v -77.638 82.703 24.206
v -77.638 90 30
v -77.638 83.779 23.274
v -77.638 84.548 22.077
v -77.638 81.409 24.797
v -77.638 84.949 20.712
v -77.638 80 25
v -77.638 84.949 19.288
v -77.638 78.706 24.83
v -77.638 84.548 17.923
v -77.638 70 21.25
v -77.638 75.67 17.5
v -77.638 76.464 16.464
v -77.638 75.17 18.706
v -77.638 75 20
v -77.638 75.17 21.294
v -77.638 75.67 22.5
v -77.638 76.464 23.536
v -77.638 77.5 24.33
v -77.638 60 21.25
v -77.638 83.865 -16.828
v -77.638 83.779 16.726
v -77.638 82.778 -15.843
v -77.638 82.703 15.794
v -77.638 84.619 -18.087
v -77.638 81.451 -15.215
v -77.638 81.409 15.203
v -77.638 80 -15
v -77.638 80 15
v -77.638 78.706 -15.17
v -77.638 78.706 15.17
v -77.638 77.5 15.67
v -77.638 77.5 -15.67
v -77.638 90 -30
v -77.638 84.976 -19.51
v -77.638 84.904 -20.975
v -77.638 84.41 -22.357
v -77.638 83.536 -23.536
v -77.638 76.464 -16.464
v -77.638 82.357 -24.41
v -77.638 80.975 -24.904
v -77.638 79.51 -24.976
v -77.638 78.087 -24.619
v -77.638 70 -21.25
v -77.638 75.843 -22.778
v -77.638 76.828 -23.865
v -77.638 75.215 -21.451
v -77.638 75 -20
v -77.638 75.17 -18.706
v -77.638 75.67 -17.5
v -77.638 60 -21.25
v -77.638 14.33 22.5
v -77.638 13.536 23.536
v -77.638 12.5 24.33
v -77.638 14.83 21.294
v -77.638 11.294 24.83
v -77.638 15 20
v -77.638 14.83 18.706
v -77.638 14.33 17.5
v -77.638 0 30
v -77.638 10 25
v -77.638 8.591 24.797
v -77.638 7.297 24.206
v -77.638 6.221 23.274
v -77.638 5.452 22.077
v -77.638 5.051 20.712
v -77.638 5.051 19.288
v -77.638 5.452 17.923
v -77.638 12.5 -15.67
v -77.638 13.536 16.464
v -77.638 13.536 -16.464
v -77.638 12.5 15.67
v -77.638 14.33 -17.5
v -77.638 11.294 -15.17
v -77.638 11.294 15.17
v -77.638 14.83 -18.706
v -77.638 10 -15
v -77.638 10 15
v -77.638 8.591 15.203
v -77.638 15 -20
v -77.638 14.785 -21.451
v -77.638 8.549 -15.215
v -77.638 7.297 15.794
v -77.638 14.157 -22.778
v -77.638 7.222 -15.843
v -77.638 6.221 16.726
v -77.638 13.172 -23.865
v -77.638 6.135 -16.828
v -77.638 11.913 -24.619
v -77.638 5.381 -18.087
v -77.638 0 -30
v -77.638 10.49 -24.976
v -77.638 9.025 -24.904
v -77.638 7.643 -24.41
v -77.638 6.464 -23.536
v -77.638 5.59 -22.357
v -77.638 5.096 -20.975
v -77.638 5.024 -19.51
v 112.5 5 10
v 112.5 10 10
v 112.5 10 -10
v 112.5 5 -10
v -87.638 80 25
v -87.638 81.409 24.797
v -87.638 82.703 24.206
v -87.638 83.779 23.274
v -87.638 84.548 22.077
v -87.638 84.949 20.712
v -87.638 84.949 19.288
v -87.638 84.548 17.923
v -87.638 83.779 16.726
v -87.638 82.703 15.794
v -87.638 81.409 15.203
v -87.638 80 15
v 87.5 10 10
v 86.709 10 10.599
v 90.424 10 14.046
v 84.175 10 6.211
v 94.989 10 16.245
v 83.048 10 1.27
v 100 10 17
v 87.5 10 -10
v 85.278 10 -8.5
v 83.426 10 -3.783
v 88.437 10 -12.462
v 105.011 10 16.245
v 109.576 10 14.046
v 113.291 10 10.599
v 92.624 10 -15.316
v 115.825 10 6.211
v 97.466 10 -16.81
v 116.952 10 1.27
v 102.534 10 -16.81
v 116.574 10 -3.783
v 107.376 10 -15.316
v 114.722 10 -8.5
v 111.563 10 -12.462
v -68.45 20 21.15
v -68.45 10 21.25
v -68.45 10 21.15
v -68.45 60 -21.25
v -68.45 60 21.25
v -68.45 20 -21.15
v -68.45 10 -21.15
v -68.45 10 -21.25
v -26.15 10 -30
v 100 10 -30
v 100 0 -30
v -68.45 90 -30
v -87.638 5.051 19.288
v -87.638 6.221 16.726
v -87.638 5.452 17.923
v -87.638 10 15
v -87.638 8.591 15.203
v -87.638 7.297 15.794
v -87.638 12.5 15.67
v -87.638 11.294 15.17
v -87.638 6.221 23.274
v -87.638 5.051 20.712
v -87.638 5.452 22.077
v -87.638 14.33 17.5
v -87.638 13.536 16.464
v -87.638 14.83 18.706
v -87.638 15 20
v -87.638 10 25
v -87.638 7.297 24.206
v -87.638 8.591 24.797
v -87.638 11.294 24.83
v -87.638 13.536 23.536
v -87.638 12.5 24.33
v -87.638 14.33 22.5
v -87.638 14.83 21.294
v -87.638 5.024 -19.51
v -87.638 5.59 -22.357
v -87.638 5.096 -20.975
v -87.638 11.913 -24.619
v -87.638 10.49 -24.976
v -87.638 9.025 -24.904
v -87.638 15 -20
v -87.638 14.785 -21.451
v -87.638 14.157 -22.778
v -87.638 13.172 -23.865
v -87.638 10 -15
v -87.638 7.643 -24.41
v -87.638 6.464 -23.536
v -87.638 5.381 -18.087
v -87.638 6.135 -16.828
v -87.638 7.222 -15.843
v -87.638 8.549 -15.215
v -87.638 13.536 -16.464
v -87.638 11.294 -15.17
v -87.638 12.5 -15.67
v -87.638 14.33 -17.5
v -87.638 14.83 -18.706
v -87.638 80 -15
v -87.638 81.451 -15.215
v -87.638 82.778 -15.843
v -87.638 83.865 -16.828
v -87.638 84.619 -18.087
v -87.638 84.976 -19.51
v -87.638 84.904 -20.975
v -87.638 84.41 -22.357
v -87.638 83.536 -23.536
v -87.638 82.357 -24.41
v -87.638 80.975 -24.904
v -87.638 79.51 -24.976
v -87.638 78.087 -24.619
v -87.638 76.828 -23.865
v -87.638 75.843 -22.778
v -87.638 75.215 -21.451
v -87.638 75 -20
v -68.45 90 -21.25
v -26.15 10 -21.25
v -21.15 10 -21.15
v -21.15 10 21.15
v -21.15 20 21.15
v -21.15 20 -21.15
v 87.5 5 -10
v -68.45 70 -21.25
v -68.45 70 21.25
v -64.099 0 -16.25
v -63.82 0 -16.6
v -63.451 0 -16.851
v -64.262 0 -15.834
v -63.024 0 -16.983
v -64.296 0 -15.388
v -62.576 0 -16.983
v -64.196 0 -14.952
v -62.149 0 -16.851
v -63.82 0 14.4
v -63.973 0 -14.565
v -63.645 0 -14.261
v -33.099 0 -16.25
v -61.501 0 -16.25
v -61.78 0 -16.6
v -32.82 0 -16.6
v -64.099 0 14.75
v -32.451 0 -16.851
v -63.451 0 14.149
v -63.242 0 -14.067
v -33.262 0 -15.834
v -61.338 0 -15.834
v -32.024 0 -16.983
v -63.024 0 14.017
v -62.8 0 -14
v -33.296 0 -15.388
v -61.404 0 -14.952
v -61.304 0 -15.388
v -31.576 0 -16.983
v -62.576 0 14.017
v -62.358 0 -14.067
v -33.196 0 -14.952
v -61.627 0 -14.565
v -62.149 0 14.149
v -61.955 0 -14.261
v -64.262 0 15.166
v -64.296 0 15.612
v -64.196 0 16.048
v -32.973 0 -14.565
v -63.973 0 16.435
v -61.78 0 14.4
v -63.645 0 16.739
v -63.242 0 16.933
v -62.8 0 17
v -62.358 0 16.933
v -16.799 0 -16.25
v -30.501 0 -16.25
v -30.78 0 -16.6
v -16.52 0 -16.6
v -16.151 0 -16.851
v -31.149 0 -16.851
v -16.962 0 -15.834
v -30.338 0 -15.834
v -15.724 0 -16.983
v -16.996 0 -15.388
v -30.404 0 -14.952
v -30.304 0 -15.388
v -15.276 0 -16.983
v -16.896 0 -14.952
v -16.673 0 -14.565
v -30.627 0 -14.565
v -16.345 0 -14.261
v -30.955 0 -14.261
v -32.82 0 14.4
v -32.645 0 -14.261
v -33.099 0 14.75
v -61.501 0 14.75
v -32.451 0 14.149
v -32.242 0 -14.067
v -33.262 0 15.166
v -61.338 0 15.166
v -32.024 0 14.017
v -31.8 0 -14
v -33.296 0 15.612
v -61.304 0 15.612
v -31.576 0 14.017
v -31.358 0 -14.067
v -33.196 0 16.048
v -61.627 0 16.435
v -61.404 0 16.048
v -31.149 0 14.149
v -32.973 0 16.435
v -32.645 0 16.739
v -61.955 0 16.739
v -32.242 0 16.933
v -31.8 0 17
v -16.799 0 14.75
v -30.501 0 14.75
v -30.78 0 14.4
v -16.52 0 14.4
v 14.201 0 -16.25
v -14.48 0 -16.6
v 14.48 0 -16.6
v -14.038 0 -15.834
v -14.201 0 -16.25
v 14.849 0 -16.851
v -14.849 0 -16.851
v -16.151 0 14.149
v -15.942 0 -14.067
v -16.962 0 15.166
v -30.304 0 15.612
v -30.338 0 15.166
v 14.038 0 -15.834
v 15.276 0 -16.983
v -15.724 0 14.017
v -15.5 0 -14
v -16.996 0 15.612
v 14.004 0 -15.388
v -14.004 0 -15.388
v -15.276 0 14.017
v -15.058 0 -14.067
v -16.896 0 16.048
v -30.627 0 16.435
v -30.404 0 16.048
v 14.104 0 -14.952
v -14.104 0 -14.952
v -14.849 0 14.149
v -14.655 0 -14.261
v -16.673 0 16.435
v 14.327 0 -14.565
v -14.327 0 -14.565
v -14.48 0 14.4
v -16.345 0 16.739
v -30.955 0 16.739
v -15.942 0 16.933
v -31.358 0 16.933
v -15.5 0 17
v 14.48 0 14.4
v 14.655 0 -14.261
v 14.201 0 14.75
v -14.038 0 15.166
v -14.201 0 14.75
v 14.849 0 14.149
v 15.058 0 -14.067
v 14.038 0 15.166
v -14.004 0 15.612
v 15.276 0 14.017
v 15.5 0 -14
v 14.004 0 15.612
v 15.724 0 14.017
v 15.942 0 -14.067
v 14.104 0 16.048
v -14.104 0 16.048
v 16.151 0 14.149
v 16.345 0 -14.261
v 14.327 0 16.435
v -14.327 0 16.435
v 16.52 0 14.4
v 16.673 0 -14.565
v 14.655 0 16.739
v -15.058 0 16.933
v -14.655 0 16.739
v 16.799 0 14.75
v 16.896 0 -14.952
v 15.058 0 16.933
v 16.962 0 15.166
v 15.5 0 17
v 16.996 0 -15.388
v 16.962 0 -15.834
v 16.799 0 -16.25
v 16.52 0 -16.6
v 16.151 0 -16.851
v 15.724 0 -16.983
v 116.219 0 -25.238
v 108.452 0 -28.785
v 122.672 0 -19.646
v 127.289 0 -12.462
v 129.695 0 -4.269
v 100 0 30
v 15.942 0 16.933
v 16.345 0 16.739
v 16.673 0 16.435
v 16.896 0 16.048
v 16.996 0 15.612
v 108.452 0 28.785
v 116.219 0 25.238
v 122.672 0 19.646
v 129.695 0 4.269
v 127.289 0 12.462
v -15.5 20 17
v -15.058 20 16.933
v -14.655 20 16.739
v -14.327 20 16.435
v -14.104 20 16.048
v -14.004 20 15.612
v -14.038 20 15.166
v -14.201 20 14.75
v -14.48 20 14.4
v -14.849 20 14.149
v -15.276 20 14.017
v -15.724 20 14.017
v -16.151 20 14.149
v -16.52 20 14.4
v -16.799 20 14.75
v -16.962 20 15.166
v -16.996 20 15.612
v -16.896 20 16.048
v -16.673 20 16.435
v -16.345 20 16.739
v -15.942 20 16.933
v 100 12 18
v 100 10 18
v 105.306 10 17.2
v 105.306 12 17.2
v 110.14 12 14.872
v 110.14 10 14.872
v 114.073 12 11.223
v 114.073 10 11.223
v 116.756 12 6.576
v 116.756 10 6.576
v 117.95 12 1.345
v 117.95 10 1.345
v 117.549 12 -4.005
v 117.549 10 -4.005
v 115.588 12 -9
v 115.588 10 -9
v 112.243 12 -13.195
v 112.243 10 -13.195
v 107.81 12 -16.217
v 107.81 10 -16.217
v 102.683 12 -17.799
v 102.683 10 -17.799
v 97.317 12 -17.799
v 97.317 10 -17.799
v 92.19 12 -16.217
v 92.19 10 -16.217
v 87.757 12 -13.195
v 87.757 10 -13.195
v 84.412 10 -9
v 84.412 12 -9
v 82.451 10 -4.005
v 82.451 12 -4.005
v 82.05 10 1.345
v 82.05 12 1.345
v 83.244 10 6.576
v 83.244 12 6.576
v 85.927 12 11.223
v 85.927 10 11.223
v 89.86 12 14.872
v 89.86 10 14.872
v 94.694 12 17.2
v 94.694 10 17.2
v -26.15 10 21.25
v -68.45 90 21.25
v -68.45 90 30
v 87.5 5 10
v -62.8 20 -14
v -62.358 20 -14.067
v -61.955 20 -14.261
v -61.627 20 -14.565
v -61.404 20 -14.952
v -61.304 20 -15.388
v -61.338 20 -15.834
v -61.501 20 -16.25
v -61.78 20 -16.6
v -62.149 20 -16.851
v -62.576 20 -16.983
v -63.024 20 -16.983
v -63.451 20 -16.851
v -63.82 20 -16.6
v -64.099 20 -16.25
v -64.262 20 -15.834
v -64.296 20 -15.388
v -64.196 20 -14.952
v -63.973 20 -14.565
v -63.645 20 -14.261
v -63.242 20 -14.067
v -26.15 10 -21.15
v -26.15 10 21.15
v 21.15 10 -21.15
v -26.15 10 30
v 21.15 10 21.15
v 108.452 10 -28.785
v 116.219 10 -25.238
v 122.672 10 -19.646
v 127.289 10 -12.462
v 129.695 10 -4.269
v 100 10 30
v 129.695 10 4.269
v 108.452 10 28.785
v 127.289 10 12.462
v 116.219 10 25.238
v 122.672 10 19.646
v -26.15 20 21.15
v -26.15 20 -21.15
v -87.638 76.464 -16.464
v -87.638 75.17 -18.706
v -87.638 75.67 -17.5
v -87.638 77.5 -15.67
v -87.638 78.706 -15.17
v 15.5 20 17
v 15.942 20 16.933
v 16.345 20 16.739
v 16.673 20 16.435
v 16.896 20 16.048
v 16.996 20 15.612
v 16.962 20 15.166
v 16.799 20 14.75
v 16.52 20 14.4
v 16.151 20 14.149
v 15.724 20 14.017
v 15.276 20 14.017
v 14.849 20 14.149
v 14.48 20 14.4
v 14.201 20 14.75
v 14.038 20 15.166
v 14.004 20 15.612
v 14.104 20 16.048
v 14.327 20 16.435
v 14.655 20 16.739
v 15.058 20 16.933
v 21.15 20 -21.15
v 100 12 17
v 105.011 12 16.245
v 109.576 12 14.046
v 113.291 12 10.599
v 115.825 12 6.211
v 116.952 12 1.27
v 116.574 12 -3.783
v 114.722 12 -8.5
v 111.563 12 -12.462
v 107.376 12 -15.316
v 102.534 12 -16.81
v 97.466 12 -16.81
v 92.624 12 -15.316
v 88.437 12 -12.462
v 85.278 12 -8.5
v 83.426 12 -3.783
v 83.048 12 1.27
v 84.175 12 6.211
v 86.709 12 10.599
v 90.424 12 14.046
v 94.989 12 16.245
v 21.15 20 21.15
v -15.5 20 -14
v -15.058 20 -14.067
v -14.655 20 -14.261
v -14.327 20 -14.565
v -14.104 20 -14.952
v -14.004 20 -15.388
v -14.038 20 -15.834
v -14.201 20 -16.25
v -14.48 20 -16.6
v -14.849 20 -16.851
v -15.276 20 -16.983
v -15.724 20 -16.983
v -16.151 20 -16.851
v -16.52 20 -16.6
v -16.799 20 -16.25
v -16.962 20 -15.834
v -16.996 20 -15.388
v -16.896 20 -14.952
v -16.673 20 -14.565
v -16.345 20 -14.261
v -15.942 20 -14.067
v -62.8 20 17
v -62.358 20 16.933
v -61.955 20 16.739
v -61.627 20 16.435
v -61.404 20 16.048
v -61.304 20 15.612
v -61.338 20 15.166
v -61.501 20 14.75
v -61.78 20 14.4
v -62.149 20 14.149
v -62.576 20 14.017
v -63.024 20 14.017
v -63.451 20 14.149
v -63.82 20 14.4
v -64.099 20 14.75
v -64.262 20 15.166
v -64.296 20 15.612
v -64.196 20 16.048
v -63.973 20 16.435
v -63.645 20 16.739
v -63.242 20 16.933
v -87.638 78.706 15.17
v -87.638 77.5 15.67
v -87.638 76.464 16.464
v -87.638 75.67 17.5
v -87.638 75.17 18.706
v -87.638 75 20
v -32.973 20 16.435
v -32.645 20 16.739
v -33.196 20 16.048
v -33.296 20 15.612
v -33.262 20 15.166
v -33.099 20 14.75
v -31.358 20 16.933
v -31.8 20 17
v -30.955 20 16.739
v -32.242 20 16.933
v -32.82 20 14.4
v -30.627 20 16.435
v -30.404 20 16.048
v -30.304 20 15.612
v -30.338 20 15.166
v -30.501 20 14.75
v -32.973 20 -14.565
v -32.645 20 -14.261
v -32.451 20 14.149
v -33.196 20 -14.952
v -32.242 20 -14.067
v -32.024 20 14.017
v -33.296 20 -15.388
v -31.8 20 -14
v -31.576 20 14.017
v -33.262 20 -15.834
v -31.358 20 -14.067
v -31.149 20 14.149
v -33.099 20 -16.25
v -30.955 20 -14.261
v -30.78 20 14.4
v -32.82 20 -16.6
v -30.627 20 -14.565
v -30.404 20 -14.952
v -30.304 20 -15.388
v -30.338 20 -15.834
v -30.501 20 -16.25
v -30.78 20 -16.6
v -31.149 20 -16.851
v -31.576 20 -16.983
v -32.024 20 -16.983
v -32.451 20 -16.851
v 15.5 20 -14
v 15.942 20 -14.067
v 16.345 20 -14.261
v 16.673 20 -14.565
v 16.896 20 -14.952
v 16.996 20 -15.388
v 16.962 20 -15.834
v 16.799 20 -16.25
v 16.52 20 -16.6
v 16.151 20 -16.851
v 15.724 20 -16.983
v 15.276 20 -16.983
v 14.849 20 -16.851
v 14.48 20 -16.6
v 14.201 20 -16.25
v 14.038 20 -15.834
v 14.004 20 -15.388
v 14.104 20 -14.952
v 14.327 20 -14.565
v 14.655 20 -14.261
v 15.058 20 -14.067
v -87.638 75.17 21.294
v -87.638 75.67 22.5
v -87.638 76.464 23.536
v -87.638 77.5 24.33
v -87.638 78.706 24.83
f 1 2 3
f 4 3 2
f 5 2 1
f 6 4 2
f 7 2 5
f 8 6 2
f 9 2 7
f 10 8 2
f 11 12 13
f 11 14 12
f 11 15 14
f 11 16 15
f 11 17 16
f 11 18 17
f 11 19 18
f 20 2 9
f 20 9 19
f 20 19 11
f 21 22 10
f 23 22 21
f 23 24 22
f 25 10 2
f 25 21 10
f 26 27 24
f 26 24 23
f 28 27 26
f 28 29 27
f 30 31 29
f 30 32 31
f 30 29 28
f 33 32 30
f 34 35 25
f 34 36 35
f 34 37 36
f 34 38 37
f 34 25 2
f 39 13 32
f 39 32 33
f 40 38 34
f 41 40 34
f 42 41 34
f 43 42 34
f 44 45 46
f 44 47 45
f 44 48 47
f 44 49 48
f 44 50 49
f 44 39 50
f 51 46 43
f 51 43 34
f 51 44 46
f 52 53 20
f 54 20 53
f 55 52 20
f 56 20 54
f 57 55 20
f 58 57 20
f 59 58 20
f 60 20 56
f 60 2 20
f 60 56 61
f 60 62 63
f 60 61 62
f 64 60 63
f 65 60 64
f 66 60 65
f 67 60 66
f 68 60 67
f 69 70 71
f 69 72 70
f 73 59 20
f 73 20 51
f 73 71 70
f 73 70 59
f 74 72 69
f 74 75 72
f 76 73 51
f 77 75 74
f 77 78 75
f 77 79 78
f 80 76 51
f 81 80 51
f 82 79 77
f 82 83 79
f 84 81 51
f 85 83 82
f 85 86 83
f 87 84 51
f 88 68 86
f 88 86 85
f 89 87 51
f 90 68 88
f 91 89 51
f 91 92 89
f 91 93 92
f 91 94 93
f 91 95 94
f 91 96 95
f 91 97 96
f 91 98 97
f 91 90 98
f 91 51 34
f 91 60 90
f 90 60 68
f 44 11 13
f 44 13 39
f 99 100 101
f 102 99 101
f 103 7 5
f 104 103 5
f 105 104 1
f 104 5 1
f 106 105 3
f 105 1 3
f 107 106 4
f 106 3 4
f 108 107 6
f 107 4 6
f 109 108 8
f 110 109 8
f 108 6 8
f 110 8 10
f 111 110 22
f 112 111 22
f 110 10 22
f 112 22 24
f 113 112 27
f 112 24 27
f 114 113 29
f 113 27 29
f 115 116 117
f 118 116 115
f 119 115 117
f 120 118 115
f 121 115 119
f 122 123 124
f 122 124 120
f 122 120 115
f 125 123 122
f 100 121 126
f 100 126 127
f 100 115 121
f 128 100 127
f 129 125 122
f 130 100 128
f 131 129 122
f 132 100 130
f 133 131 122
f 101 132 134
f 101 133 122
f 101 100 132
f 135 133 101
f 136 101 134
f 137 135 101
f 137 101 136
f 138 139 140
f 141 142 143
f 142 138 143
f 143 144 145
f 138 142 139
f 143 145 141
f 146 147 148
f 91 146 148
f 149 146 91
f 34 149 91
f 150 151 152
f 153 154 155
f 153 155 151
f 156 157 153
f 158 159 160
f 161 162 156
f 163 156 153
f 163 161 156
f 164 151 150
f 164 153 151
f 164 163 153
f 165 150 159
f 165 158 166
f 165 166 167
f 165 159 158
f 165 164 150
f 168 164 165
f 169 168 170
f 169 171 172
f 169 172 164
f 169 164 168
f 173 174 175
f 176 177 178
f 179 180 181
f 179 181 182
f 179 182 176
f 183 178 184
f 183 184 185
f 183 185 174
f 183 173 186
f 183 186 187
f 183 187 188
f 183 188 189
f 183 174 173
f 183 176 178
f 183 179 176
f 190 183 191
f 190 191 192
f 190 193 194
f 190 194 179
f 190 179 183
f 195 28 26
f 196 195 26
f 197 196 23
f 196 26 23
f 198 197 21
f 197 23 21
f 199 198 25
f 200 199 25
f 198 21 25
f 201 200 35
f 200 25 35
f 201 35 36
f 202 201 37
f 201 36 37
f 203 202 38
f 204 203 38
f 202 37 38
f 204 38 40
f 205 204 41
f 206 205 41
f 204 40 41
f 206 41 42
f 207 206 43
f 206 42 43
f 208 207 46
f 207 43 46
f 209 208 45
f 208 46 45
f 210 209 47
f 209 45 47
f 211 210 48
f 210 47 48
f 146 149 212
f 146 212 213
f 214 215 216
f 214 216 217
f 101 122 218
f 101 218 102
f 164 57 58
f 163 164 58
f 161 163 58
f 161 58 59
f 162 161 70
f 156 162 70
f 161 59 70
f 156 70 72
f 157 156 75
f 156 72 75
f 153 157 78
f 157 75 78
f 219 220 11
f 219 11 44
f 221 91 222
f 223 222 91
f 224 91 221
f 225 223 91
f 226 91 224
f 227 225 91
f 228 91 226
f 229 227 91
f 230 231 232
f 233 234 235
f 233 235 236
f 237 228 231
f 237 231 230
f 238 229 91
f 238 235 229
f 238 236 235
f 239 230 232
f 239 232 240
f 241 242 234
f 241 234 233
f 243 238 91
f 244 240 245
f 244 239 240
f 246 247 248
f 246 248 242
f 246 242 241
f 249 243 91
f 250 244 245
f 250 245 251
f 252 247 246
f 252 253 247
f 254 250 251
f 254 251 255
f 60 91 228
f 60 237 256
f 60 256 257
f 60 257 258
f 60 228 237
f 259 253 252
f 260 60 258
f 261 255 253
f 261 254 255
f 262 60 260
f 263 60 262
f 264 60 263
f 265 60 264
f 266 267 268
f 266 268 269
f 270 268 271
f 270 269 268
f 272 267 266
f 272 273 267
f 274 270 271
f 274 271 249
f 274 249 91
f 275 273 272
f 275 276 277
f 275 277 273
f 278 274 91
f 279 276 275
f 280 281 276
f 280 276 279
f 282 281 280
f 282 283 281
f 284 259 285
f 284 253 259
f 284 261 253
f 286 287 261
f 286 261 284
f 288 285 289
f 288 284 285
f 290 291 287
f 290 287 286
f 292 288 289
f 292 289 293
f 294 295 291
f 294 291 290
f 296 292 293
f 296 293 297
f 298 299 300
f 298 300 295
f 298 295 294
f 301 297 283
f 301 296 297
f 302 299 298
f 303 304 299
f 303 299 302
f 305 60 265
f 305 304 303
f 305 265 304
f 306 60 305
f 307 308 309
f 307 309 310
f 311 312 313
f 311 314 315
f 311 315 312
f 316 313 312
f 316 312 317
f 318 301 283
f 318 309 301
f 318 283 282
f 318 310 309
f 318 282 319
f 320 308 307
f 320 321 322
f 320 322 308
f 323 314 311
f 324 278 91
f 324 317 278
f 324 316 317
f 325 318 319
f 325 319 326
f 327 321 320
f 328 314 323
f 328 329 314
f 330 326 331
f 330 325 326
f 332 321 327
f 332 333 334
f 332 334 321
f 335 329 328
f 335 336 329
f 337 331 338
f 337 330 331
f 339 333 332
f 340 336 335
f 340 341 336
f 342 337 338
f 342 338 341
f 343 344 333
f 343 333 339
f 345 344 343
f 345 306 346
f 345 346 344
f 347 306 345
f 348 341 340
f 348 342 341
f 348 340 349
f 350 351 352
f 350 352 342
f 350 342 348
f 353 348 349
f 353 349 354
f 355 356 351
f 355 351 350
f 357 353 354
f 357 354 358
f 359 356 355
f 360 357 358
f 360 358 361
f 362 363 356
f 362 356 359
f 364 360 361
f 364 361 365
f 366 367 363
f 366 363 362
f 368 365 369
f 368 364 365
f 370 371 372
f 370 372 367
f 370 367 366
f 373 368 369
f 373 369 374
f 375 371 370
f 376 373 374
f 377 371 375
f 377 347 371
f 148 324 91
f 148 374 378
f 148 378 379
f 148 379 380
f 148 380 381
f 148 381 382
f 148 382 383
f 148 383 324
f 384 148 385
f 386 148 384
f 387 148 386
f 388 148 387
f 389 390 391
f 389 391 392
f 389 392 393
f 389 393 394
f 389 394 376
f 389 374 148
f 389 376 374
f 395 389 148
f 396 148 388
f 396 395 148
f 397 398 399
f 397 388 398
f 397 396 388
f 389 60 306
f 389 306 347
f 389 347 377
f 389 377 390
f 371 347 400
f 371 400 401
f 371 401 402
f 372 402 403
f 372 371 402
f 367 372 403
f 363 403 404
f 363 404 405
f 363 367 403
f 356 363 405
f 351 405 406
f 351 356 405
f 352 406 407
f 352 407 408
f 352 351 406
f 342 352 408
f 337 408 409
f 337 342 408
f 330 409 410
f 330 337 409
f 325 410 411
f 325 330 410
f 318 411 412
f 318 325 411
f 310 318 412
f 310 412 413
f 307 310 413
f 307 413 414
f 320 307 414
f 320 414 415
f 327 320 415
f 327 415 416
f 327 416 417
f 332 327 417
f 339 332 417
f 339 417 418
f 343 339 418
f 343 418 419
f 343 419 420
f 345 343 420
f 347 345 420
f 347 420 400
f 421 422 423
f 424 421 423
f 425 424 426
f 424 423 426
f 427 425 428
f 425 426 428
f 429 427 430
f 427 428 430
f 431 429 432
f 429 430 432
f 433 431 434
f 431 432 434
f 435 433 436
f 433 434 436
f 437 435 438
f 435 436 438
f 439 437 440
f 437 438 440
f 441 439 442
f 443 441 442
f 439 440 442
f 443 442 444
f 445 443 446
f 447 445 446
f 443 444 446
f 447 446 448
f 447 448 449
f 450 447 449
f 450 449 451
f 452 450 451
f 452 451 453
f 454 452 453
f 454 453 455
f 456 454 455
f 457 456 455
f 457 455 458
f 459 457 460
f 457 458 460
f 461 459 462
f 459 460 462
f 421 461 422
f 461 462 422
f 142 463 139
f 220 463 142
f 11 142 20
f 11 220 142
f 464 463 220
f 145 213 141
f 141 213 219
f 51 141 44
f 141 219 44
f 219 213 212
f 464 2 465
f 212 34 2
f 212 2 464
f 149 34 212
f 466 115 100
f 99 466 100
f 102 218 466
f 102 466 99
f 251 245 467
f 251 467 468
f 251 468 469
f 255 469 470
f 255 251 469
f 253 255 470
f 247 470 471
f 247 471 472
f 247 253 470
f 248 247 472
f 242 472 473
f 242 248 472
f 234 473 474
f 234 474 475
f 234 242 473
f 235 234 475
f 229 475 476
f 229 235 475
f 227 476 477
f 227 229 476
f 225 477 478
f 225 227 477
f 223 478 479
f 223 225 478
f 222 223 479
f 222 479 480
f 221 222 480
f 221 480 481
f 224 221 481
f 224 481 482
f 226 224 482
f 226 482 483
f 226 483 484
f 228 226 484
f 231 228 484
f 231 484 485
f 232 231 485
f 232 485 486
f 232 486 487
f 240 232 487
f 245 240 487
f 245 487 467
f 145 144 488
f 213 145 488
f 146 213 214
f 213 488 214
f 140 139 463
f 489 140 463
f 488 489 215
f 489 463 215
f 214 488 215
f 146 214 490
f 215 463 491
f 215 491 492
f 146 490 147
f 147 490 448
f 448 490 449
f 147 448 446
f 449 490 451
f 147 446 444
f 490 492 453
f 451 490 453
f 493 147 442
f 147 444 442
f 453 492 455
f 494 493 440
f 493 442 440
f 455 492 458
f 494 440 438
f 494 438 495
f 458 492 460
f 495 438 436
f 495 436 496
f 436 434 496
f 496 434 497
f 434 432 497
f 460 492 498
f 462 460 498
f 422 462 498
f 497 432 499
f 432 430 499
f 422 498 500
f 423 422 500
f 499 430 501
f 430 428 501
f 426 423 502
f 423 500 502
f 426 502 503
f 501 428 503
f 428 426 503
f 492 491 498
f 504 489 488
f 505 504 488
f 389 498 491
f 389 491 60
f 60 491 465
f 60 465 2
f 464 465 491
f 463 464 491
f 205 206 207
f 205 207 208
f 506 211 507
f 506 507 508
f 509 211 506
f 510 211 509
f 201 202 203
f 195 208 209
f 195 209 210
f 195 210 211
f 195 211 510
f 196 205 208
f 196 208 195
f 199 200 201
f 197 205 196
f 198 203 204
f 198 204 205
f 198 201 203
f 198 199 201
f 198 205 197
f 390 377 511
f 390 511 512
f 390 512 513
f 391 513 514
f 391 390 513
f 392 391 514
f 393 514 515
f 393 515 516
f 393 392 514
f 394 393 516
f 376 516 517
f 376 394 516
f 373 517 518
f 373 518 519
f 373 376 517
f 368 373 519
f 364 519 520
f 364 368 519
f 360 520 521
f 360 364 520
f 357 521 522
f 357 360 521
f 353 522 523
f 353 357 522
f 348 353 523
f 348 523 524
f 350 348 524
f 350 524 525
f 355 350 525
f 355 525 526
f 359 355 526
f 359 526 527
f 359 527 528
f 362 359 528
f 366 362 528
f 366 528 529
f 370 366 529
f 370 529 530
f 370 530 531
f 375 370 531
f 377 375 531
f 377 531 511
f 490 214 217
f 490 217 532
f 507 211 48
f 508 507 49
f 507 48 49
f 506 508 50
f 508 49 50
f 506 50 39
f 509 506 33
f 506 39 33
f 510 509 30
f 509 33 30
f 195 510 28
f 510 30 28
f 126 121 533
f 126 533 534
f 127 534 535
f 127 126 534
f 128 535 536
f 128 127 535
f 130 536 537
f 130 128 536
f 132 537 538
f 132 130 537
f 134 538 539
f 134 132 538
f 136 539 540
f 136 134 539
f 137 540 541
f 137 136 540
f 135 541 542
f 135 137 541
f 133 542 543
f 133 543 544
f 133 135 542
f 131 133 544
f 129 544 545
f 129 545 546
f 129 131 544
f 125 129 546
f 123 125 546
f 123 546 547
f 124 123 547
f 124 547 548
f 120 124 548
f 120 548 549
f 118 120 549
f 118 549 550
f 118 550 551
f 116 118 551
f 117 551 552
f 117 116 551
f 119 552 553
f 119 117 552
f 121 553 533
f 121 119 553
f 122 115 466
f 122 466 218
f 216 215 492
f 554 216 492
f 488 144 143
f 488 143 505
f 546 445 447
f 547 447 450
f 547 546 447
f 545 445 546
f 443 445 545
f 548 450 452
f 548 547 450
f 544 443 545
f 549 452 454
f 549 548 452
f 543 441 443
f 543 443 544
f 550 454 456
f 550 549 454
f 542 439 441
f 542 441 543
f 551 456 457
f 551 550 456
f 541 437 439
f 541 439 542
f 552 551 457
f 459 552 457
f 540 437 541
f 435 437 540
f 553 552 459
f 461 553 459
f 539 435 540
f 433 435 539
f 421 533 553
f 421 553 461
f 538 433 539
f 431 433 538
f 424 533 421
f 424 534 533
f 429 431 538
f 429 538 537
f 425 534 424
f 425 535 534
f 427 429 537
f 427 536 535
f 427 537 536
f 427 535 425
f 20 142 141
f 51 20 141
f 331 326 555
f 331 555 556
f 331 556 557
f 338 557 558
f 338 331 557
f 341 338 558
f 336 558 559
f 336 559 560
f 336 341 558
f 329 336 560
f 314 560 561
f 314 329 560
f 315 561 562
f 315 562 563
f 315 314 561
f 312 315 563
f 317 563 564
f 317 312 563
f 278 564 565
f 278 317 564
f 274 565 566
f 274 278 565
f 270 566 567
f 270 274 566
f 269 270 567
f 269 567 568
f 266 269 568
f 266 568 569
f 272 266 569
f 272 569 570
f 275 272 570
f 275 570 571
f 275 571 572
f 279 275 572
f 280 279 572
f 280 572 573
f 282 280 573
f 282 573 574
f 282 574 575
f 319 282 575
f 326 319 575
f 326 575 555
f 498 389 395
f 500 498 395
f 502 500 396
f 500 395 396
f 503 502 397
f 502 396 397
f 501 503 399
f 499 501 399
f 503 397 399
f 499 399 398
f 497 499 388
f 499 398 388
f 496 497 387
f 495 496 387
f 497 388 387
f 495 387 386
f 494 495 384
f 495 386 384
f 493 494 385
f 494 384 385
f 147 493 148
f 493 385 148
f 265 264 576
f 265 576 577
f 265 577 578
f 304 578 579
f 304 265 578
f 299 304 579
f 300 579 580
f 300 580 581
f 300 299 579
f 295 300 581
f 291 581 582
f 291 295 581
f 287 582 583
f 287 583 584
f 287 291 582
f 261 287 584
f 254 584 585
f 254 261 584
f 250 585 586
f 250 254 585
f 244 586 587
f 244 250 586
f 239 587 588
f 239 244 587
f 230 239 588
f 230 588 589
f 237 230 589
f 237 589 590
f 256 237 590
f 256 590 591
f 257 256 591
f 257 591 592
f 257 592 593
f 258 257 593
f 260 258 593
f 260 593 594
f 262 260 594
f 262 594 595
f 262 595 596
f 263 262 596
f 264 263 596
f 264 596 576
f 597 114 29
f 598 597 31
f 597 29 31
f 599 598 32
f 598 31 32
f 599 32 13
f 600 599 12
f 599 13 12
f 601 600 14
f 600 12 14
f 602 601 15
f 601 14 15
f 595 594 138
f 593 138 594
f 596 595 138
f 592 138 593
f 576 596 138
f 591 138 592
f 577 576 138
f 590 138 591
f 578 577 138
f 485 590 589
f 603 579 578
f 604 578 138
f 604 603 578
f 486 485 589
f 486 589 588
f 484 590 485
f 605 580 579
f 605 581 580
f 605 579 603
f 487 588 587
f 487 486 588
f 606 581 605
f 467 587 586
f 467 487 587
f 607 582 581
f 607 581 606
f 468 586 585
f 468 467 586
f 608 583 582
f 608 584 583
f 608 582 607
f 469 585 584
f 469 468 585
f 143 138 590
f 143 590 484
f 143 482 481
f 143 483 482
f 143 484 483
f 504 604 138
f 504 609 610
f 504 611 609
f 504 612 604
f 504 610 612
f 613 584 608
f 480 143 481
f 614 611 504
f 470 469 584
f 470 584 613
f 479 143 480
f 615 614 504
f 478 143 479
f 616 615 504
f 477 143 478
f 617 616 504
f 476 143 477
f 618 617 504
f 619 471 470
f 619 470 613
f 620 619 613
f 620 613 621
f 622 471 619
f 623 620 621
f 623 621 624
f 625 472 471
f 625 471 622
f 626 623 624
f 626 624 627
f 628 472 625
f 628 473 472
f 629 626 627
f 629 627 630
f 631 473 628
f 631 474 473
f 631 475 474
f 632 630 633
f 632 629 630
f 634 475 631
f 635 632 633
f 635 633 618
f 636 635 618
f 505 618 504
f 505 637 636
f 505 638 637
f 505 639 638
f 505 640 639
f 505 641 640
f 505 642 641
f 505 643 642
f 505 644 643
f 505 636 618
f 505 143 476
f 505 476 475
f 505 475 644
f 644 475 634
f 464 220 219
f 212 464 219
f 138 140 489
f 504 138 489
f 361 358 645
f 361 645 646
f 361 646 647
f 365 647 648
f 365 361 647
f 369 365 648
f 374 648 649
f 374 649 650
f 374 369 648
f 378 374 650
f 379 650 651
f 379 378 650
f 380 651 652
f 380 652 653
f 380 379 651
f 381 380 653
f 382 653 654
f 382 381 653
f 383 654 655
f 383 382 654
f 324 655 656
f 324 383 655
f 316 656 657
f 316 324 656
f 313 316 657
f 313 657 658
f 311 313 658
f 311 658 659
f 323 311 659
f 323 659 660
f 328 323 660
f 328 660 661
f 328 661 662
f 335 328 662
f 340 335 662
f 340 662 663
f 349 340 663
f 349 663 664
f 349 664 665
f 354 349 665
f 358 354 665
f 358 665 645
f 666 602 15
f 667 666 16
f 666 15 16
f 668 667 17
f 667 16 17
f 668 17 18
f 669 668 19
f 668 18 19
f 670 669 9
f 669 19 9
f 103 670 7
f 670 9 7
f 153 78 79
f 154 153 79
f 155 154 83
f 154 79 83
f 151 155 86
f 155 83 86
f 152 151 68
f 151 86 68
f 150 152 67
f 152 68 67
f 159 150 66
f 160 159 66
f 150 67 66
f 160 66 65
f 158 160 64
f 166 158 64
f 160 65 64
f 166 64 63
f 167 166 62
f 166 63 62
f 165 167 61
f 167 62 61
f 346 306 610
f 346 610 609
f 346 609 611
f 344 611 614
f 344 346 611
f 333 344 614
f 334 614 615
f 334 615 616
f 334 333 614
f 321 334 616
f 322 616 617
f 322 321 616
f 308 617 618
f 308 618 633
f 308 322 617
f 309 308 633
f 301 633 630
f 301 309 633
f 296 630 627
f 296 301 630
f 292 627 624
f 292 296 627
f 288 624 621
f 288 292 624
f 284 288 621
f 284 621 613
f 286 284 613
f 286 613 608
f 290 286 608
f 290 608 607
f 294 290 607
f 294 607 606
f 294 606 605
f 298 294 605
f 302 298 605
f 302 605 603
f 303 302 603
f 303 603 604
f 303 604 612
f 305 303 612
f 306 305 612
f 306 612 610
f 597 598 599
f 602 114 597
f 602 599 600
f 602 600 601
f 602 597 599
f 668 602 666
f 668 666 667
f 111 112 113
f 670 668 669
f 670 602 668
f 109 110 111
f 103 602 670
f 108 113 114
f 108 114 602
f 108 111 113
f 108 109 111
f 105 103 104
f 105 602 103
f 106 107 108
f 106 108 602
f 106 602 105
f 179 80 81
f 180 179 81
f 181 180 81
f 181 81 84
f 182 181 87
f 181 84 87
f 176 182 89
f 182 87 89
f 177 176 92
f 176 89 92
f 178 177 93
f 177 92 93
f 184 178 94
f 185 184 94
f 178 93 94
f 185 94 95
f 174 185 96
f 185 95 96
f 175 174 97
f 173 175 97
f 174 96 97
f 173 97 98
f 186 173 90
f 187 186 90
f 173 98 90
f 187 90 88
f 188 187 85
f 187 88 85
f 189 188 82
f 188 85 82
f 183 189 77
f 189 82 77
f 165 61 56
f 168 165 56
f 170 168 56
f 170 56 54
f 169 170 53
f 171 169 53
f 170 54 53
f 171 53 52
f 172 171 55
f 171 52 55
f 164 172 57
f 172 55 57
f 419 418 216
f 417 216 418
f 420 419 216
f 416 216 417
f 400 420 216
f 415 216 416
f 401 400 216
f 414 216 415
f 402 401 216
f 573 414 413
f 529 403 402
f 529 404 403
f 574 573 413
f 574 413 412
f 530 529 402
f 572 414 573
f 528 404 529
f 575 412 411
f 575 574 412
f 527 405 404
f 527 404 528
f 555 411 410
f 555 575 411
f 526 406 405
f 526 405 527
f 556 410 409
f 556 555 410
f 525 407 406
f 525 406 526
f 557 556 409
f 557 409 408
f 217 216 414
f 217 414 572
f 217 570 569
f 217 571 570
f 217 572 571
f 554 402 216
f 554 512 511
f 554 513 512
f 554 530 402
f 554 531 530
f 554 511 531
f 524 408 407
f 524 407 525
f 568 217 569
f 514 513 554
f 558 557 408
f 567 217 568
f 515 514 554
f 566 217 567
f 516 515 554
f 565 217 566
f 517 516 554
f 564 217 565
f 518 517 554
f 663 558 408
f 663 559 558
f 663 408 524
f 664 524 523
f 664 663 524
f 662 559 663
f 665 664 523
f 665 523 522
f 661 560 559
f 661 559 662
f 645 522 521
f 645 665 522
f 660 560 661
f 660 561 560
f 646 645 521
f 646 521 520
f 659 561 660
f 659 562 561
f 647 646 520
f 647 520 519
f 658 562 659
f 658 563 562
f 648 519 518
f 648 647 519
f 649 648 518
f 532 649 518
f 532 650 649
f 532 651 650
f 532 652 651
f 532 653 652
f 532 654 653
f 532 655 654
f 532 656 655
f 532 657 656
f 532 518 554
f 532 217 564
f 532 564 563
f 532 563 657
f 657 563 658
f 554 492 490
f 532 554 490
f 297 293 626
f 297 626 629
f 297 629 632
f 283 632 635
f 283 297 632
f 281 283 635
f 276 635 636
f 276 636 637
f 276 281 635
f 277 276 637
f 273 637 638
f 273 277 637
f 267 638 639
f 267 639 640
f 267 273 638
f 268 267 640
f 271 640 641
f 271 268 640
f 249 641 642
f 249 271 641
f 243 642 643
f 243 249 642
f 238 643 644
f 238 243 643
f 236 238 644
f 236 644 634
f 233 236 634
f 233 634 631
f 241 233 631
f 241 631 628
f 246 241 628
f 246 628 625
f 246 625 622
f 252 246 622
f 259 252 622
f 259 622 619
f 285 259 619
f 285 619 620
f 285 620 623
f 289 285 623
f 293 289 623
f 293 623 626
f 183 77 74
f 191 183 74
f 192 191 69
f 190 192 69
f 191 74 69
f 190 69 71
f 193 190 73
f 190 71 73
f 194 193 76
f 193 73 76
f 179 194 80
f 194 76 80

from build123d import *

# Parameters (mm, degrees)
SKETCH2_R           = 1.5
BOSS_EXTRUDE1_DEPTH = 10
SKETCH3_W           = 25
SKETCH3_H           = 20
CUT_EXTRUDE1_DEPTH  = 5
SKETCH5_R           = 18
SKETCH5_R_2         = 17
BOSS_EXTRUDE2_DEPTH = 2
SKETCH2_3_W         = 42.3
SKETCH2_3_H         = 42.3
SKETCH2_3_R         = 1.5
BOSS_EXTRUDE3_DEPTH = 20
SKETCH8_W           = 40
SKETCH8_H           = 60
BOSS_EXTRUDE4_DEPTH = 10
SKETCH9_W           = 42.3
SKETCH9_H           = 42.3
SKETCH9_R           = 1.5
BOSS_EXTRUDE5_DEPTH = 10
CUT_EXTRUDE3_START  = -10
SKETCH9_3_R         = 1.5
CUT_EXTRUDE3_DEPTH  = 10
SKETCH10_W          = 9.18782392
SKETCH10_H          = 60
BOSS_EXTRUDE6_DEPTH = 80
BOSS_EXTRUDE7_DEPTH = 8.75
BOSS_EXTRUDE9_DEPTH = 10
SKETCH16_W          = 42.5
SKETCH16_H          = 10
CUT_EXTRUDE5_DEPTH  = 9.18782392


with BuildPart() as part:
    # Sketch2 → Boss-Extrude1 (new body)
    with BuildSketch(Plane(origin=(0, 0, 0), x_dir=(1, 0, 0), z_dir=(0, 1, 0))):
        with BuildLine():
            Line((-37.63782392, -30), (100, -30))
            ThreePointArc((100, -30), (130, 0), (100, 30))
            Line((100, 30), (-37.63782392, 30))
            Line((-37.63782392, 30), (-37.63782392, -30))
        make_face()
        with Locations(Location((-15.5, 15.5, 0), (0, 0, 270))):
            Circle(SKETCH2_R, mode=Mode.SUBTRACT)
        with Locations(Location((15.5, -15.5, 0), (0, 0, 270))):
            Circle(SKETCH2_R, mode=Mode.SUBTRACT)
        with Locations(Location((-15.5, -15.5, 0), (0, 0, 270))):
            Circle(SKETCH2_R, mode=Mode.SUBTRACT)
        with Locations(Location((15.5, 15.5, 0), (0, 0, 270))):
            Circle(SKETCH2_R, mode=Mode.SUBTRACT)
    extrude(amount=BOSS_EXTRUDE1_DEPTH)

    # Sketch3 → Cut-Extrude1 (cut)
    with BuildSketch(Plane(origin=(0, 10, 0), x_dir=(1, 0, 0), z_dir=(0, 1, 0))):
        with Locations((100, 0)):
            Rectangle(SKETCH3_W, SKETCH3_H)
    extrude(amount=-CUT_EXTRUDE1_DEPTH, mode=Mode.SUBTRACT)

    # Sketch5 → Boss-Extrude2 (add)
    with BuildSketch(Plane(origin=(0, 10, 0), x_dir=(1, 0, 0), z_dir=(0, 1, 0))):
        with Locations(Location((100, 0, 0), (0, 0, 270))):
            Circle(SKETCH5_R)
        with Locations(Location((100, 0, 0), (0, 0, 270))):
            Circle(SKETCH5_R_2, mode=Mode.SUBTRACT)
    extrude(amount=BOSS_EXTRUDE2_DEPTH)

    # Sketch2<3> → Boss-Extrude3 (add)
    with BuildSketch(Plane(origin=(0, 0, 0), x_dir=(1, 0, 0), z_dir=(0, 1, 0))):
        Rectangle(SKETCH2_3_W, SKETCH2_3_H)
        with Locations(Location((-15.5, -15.5, 0), (0, 0, 270))):
            Circle(SKETCH2_3_R, mode=Mode.SUBTRACT)
        with Locations(Location((15.5, -15.5, 0), (0, 0, 270))):
            Circle(SKETCH2_3_R, mode=Mode.SUBTRACT)
        with Locations(Location((15.5, 15.5, 0), (0, 0, 270))):
            Circle(SKETCH2_3_R, mode=Mode.SUBTRACT)
        with Locations(Location((-15.5, 15.5, 0), (0, 0, 270))):
            Circle(SKETCH2_3_R, mode=Mode.SUBTRACT)
    extrude(amount=BOSS_EXTRUDE3_DEPTH)

    # Sketch8 → Boss-Extrude4 (add)
    with BuildSketch(Plane.XZ):
        with Locations((-57.63782392, 0)):
            Rectangle(SKETCH8_W, SKETCH8_H)
    extrude(amount=-BOSS_EXTRUDE4_DEPTH)

    # Sketch9 → Boss-Extrude5 (add)
    with BuildSketch(Plane(origin=(0, 10, 0), x_dir=(1, 0, 0), z_dir=(0, 1, 0))):
        with Locations((-47.3, 0)):
            Rectangle(SKETCH9_W, SKETCH9_H)
        with Locations(Location((-31.8, 15.5, 0), (0, 0, 270))):
            Circle(SKETCH9_R, mode=Mode.SUBTRACT)
        with Locations(Location((-31.8, -15.5, 0), (0, 0, 270))):
            Circle(SKETCH9_R, mode=Mode.SUBTRACT)
        with Locations(Location((-62.8, -15.5, 0), (0, 0, 270))):
            Circle(SKETCH9_R, mode=Mode.SUBTRACT)
        with Locations(Location((-62.8, 15.5, 0), (0, 0, 270))):
            Circle(SKETCH9_R, mode=Mode.SUBTRACT)
    extrude(amount=BOSS_EXTRUDE5_DEPTH)

    # Sketch9<3> → Cut-Extrude3 (cut)
    with BuildSketch(Plane(origin=(0, 10, 0), x_dir=(1, 0, 0), z_dir=(0, 1, 0)).offset(CUT_EXTRUDE3_START)):
        with Locations(Location((-62.8, -15.5, 0), (0, 0, 270))):
            Circle(SKETCH9_3_R)
        with Locations(Location((-31.8, -15.5, 0), (0, 0, 270))):
            Circle(SKETCH9_3_R)
        with Locations(Location((-31.8, 15.5, 0), (0, 0, 270))):
            Circle(SKETCH9_3_R)
        with Locations(Location((-62.8, 15.5, 0), (0, 0, 270))):
            Circle(SKETCH9_3_R)
    extrude(amount=CUT_EXTRUDE3_DEPTH, mode=Mode.SUBTRACT)

    # Sketch10 → Boss-Extrude6 (add)
    with BuildSketch(Plane(origin=(0, 10, 0), x_dir=(1, 0, 0), z_dir=(0, 1, 0))):
        with Locations((-73.04391196, 0)):
            Rectangle(SKETCH10_W, SKETCH10_H)
    extrude(amount=BOSS_EXTRUDE6_DEPTH)

    # Sketch13 → Boss-Extrude7 (add)
    with BuildSketch(Plane.XY.offset(30)):
        Polygon((-68.45, 90), (-26.15, 10), (-68.45, 10), align=None)
    boss_extrude7 = extrude(amount=-BOSS_EXTRUDE7_DEPTH)

    # Mirror2: Boss-Extrude7 across plane
    add(boss_extrude7.mirror(Plane.XY))

    # Sketch11 → Boss-Extrude9 (add)
    with BuildSketch(Plane.ZY.offset(77.63782392)):
        with BuildLine():
            ThreePointArc((-15, 80), (-23.535533906, 83.535533906), (-20, 75))
            Line((-20, 75), (-20, 80))
            Line((-20, 80), (-15, 80))
        make_face()
        with BuildLine():
            Line((-20, 80), (-20, 75))
            ThreePointArc((-20, 75), (-16.464466094, 76.464466094), (-15, 80))
            Line((-15, 80), (-20, 80))
        make_face()
        with BuildLine():
            ThreePointArc((15, 80), (16.464466094, 76.464466094), (20, 75))
            Line((20, 75), (20, 80))
            Line((20, 80), (15, 80))
        make_face()
        with BuildLine():
            Line((20, 80), (20, 75))
            ThreePointArc((20, 75), (23.535533906, 76.464466094), (25, 80))
            ThreePointArc((25, 80), (20, 85), (15, 80))
            Line((15, 80), (20, 80))
        make_face()
        with BuildLine():
            ThreePointArc((20, 15), (16.464466094, 13.535533906), (15, 10))
            Line((15, 10), (20, 10))
            Line((20, 10), (20, 15))
        make_face()
        with BuildLine():
            Line((20, 10), (15, 10))
            ThreePointArc((15, 10), (20, 5), (25, 10))
            ThreePointArc((25, 10), (23.535533906, 13.535533906), (20, 15))
            Line((20, 15), (20, 10))
        make_face()
        with BuildLine():
            Line((-20, 15), (-20, 10))
            Line((-20, 10), (-15, 10))
            ThreePointArc((-15, 10), (-16.464466094, 13.535533906), (-20, 15))
        make_face()
        with BuildLine():
            Line((-15, 10), (-20, 10))
            Line((-20, 10), (-20, 15))
            ThreePointArc((-20, 15), (-23.535533906, 6.464466094), (-15, 10))
        make_face()
    extrude(amount=BOSS_EXTRUDE9_DEPTH)

    # Sketch16 → Cut-Extrude5 (cut)
    with BuildSketch(Plane(origin=(-68.45, 0, 0), x_dir=(0, 0, -1), z_dir=(1, 0, 0))):
        with Locations((0, 65)):
            Rectangle(SKETCH16_W, SKETCH16_H)
    extrude(amount=-CUT_EXTRUDE5_DEPTH, mode=Mode.SUBTRACT)


solid = part.part
